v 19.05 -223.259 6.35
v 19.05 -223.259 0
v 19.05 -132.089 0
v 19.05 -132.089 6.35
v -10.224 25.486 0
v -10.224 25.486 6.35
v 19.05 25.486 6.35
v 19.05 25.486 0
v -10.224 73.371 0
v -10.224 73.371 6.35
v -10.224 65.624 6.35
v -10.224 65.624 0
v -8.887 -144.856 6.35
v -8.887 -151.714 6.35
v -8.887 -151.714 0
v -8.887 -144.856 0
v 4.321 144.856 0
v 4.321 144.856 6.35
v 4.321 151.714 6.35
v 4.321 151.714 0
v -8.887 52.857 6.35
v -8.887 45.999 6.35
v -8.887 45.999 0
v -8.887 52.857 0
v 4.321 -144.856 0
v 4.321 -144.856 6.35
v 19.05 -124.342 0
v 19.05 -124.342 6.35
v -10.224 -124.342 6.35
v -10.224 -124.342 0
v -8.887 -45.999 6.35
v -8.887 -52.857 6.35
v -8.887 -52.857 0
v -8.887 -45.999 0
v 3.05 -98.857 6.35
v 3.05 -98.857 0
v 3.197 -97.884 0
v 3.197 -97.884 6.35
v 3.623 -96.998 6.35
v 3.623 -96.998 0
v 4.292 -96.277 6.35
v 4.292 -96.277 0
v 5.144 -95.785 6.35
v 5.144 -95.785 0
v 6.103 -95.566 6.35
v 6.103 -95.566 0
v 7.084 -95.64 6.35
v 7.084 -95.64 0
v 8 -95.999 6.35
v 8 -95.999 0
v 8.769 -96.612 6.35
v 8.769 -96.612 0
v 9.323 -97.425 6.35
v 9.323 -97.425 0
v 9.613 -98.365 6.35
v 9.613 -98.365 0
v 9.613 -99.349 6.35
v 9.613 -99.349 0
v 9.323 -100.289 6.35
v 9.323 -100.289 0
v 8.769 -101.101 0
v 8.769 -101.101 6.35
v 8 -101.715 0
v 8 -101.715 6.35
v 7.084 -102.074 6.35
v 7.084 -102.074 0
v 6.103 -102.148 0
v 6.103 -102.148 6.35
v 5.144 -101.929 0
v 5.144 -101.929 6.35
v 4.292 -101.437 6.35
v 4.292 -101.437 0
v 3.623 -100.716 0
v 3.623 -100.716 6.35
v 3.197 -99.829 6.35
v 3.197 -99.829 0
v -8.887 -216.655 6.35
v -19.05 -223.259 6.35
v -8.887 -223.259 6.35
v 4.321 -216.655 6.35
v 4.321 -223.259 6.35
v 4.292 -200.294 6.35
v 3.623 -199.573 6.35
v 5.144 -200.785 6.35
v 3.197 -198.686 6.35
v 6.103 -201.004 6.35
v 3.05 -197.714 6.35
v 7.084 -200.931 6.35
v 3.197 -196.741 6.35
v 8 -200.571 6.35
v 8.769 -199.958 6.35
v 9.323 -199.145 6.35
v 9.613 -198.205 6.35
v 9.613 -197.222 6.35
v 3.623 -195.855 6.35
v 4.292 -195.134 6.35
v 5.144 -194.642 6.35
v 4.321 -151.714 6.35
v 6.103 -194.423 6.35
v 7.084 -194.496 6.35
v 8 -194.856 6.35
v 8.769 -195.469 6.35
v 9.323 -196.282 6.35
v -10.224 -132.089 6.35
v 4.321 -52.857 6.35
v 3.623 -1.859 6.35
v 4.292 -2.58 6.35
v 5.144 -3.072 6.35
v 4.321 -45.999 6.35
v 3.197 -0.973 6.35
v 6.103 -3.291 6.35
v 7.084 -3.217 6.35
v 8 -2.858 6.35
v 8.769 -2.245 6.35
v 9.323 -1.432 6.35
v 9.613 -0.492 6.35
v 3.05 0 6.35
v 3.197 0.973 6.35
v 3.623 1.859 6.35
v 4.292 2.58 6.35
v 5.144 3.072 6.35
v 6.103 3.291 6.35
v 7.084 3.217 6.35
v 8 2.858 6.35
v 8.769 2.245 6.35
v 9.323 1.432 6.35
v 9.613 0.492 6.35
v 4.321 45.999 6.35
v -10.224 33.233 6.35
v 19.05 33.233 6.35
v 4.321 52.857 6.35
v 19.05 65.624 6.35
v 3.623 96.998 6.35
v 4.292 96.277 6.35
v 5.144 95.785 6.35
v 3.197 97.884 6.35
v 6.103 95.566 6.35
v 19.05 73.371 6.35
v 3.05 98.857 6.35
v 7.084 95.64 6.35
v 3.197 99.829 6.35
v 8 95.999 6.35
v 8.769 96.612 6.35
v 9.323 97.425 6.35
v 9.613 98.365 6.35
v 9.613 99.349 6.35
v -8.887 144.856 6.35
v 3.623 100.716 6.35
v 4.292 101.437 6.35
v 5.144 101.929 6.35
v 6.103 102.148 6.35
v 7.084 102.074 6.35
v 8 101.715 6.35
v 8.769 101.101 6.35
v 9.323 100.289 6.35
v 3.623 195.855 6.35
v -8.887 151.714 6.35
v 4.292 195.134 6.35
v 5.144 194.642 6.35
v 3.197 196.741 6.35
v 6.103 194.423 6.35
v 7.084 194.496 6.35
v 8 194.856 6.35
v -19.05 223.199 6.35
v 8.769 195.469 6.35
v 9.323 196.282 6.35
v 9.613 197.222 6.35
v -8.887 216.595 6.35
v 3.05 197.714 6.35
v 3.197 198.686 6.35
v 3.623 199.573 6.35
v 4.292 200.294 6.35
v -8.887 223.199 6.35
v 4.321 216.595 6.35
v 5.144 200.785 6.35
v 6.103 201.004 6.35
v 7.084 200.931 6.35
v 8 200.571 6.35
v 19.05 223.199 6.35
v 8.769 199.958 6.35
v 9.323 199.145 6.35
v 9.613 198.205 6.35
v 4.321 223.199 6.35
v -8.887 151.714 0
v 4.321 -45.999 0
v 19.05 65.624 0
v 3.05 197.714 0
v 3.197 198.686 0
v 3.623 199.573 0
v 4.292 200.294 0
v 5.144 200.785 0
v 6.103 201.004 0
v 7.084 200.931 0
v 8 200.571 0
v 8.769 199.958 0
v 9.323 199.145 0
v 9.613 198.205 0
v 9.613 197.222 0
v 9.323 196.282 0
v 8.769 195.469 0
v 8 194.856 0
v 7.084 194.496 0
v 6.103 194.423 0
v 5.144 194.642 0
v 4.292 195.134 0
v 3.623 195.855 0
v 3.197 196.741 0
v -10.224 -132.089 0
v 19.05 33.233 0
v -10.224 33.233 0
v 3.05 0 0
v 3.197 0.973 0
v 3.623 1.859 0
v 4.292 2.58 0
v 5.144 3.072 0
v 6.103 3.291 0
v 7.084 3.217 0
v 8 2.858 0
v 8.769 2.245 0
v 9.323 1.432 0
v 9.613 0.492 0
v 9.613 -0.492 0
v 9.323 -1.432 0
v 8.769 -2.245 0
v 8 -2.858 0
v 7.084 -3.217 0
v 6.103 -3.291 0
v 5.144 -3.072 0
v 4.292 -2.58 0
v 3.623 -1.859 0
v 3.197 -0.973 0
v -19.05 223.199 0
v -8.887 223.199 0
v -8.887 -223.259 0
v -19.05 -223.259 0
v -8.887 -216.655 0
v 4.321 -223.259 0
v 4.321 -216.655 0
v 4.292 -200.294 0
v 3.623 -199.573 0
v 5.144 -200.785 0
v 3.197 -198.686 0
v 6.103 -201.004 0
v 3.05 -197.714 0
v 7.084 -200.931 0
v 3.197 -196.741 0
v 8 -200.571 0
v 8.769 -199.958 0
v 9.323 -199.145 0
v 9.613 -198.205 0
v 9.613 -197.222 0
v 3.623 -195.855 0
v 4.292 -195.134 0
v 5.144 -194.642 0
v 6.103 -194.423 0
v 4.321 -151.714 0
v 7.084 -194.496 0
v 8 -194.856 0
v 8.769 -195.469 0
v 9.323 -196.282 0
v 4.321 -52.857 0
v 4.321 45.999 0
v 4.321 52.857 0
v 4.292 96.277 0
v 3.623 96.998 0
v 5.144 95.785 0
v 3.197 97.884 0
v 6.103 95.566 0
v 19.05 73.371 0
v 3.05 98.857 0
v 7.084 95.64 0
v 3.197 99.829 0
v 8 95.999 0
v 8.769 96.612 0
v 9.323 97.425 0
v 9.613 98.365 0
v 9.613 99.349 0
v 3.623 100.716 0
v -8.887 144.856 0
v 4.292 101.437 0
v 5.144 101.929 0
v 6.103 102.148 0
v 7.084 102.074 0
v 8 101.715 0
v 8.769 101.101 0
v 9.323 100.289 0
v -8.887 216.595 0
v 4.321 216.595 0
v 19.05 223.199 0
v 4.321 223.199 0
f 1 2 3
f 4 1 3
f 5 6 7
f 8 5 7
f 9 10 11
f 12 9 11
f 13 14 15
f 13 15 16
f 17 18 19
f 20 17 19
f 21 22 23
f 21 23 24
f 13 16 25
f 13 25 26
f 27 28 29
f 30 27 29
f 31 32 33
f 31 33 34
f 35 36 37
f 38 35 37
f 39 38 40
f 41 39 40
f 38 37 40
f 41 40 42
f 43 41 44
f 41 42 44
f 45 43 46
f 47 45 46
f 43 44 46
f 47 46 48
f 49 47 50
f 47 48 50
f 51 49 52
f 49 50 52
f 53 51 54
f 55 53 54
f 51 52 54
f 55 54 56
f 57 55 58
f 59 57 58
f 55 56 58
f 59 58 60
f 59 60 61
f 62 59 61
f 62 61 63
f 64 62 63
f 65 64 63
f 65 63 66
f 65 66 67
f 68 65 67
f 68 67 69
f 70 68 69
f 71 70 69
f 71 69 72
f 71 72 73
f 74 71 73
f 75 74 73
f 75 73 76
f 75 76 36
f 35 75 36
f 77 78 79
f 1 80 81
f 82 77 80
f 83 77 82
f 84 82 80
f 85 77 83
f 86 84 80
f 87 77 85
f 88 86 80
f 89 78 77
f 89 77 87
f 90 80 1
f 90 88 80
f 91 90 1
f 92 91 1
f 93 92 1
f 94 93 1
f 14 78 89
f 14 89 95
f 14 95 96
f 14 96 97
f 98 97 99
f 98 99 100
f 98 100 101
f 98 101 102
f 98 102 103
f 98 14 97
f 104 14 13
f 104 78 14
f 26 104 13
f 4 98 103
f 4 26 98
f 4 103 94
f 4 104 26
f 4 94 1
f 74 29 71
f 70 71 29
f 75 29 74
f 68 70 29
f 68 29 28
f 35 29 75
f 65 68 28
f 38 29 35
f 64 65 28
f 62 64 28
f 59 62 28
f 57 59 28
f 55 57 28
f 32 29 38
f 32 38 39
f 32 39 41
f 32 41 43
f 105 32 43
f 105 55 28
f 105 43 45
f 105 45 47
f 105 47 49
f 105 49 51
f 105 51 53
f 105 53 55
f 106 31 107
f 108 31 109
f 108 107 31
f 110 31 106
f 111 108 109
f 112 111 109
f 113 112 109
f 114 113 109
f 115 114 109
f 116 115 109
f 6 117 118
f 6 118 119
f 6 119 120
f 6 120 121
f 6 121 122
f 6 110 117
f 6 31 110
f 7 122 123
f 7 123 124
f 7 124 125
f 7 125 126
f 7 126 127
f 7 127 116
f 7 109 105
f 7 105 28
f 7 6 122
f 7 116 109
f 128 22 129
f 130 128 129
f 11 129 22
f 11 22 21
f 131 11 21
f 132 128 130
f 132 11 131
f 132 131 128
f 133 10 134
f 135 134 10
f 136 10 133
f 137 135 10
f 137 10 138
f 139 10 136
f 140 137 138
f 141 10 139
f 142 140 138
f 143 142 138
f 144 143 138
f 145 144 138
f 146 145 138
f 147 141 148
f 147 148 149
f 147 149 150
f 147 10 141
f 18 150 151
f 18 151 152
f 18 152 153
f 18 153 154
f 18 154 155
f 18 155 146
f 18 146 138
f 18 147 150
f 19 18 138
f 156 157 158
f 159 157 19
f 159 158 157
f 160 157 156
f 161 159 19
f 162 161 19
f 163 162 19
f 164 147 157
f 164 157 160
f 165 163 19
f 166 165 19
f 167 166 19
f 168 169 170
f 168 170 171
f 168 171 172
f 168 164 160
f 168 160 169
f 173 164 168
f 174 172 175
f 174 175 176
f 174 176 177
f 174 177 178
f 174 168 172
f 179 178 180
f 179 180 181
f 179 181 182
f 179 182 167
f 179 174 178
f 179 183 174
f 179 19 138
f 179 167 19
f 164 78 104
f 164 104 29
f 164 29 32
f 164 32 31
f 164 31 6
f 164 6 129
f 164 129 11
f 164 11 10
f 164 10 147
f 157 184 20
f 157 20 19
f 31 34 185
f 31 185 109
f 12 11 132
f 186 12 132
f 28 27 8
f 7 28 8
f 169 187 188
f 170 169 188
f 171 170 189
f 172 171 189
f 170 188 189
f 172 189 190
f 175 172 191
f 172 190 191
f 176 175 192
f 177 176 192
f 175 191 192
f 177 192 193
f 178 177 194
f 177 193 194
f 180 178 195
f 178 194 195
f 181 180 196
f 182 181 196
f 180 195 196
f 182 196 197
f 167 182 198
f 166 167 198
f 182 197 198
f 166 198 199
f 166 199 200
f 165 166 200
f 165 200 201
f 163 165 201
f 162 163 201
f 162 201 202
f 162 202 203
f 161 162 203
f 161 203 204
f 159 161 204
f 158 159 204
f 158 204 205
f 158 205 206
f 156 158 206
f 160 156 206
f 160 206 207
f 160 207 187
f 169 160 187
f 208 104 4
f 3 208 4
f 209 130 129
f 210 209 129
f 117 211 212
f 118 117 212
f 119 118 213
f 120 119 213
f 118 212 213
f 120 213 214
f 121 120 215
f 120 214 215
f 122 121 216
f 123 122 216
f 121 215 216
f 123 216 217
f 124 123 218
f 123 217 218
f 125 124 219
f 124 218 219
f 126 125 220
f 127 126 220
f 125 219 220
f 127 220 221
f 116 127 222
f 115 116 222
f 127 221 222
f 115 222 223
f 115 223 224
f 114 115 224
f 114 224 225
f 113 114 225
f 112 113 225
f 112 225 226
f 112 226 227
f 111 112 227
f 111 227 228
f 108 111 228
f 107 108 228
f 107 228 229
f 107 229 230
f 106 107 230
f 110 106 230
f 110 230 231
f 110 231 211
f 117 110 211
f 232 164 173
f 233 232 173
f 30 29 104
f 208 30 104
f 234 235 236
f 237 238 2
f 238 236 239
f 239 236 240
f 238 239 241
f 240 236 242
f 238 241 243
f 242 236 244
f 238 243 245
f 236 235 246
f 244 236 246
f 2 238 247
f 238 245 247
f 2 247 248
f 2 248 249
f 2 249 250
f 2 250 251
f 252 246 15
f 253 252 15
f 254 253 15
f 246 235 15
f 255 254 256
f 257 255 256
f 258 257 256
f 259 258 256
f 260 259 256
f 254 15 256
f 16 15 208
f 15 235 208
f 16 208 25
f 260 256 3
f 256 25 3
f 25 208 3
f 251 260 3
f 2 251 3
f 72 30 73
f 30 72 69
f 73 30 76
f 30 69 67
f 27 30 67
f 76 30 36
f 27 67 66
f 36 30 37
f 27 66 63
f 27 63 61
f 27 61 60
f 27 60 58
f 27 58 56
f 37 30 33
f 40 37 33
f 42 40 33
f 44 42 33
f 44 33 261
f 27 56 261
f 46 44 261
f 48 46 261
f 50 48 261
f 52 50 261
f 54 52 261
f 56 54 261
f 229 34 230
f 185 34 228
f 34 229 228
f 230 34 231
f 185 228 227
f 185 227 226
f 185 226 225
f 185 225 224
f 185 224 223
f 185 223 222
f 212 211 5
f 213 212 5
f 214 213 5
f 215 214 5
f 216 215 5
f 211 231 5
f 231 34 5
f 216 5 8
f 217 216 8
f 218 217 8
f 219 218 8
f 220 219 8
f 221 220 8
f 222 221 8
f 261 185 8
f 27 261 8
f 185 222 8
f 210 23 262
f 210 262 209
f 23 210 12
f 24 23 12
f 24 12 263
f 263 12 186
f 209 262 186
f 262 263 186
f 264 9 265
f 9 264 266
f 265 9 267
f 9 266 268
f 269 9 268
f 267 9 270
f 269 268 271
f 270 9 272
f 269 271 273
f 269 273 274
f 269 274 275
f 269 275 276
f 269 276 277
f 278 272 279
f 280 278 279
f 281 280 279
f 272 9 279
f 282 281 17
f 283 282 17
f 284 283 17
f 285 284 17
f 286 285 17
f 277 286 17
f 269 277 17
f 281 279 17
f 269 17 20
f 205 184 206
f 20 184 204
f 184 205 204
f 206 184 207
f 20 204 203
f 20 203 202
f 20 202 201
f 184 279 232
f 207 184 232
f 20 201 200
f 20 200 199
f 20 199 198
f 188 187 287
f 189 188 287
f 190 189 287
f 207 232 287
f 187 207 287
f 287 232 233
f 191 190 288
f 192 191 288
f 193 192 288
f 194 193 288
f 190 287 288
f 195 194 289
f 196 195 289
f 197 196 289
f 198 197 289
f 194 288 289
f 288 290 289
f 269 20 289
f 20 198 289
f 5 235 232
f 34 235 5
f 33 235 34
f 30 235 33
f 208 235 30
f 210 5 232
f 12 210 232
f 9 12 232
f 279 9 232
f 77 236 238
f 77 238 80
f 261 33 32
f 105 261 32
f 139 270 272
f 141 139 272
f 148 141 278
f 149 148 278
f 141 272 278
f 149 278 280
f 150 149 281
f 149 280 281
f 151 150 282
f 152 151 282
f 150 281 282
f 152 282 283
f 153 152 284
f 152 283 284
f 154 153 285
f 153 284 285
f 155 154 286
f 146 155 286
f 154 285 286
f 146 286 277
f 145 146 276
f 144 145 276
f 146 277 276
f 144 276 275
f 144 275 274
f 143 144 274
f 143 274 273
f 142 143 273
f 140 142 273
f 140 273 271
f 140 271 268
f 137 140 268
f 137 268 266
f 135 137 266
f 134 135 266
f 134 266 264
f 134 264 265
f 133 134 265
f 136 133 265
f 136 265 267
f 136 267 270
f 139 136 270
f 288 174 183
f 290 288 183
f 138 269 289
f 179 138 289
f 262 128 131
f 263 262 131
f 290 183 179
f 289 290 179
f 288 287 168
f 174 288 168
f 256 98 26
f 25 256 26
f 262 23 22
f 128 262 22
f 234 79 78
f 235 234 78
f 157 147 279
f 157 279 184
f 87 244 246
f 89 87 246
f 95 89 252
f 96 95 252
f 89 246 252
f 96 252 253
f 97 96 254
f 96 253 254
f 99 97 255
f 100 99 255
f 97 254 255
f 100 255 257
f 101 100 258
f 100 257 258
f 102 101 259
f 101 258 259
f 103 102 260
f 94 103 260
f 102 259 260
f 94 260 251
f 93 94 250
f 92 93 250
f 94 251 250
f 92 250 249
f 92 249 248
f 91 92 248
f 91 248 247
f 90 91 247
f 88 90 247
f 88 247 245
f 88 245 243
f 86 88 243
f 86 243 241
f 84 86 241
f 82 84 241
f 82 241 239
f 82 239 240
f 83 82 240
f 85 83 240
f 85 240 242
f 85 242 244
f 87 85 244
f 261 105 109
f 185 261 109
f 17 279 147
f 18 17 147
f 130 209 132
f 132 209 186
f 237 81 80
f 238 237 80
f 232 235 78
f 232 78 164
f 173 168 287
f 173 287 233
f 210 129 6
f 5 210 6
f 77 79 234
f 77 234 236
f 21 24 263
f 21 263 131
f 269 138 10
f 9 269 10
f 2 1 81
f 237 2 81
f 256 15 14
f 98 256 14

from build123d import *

# Parameters (mm, degrees)
SKETCH1_W             = 38.1
SKETCH1_H             = 498.348
SKETCH1_R             = 3
BOSS_EXTRUDE1_DEPTH   = 6.35
M6_CLEARANCE_HOLE1_D  = 6.6
LPATTERN1_COUNT       = 3
LPATTERN1_PITCH       = 98.8568
LPATTERN1_COL_COUNT   = 3
LPATTERN1_COL_PITCH   = 98.8568
SKETCH4_W             = 26.9875
SKETCH4_H             = 3.175
SKETCH4_W_2           = 25.7175
CUT_EXTRUDE1_DEPTH    = 250.981813891
LPATTERN2_START       = -8.887219794
LPATTERN2_OUTLINE_W   = 6.858
LPATTERN2_OUTLINE_H   = 6.35
LPATTERN2_OUTLINE_W_2 = 6.604
LPATTERN2_DEPTH       = 13.208


# Read off the part's stored shape, not the designer's step: LPattern2
with BuildPart() as part:
    # Sketch1 → Boss-Extrude1 (new body)
    with BuildSketch(Plane.XY):
        Rectangle(SKETCH1_W, SKETCH1_H)
        with Locations((6.35, 0)):
            Circle(SKETCH1_R, mode=Mode.SUBTRACT)
    extrude(amount=BOSS_EXTRUDE1_DEPTH)

    # M6 Clearance Hole1 (through all)
    with Locations(Plane.XY.offset(6.35)):
        with Locations((6.35, 0)):
            m6_clearance_hole1 = Hole(M6_CLEARANCE_HOLE1_D / 2)

    # LPattern1: M6 Clearance Hole1 ×3
    with Locations(*[(0, -i * LPATTERN1_PITCH, 0) for i in range(1, LPATTERN1_COUNT)]):
        add(m6_clearance_hole1, mode=Mode.SUBTRACT)

    # LPattern1 col: M6 Clearance Hole1 ×3
    with Locations(*[(0, i * LPATTERN1_COL_PITCH, 0) for i in range(1, LPATTERN1_COL_COUNT)]):
        add(m6_clearance_hole1, mode=Mode.SUBTRACT)

    # Sketch4 → Cut-Extrude1 (cut, through all)
    with BuildSketch(Plane.XY.offset(6.35)):
        Polygon((-8.9535, -231.0064), (-8.9535, -223.2594), (-19.05, -223.2594), (-19.05, -249.174), (19.05, -249.174), (19.05, -231.0064), align=None)
        Polygon((19.05, -225.5454), (19.05, -223.2594), (-8.9535, -223.2594), (-8.9535, -231.0064), (19.05, -231.0064), (19.05, -228.7204), (-6.6675, -228.7204), (-6.6675, -225.5454), align=None)
        with Locations((5.55625, -128.2159)):
            Rectangle(SKETCH4_W, SKETCH4_H)
        Polygon((-10.2235, -132.0894), (19.05, -132.0894), (19.05, -129.8034), (-7.9375, -129.8034), (-7.9375, -126.6284), (19.05, -126.6284), (19.05, -124.3424), (-10.2235, -124.3424), align=None)
        with Locations((6.19125, -227.1329)):
            Rectangle(SKETCH4_W_2, SKETCH4_H)
        with Locations((5.55625, 29.3591)):
            Rectangle(SKETCH4_W, SKETCH4_H)
        Polygon((-10.2235, 25.4856), (19.05, 25.4856), (19.05, 27.7716), (-7.9375, 27.7716), (-7.9375, 30.9466), (19.05, 30.9466), (19.05, 33.2326), (-10.2235, 33.2326), align=None)
        Polygon((19.05, 71.0852), (19.05, 73.3712), (-10.2235, 73.3712), (-10.2235, 65.6242), (19.05, 65.6242), (19.05, 67.9102), (-7.9375, 67.9102), (-7.9375, 71.0852), align=None)
        with Locations((5.55625, 69.4977)):
            Rectangle(SKETCH4_W, SKETCH4_H)
        Polygon((-19.05, 249.174), (-19.05, 223.1992), (-10.2235, 223.1992), (-10.2235, 230.9462), (19.05, 230.9462), (19.05, 249.174), align=None)
        with Locations((5.55625, 227.0727)):
            Rectangle(SKETCH4_W, SKETCH4_H)
        Polygon((-10.2235, 230.9462), (-10.2235, 223.1992), (19.05, 223.1992), (19.05, 225.4852), (-7.9375, 225.4852), (-7.9375, 228.6602), (19.05, 228.6602), (19.05, 230.9462), align=None)
    extrude(amount=-CUT_EXTRUDE1_DEPTH, mode=Mode.SUBTRACT)

    # LPattern2 outline → LPattern2 (cut)
    with BuildSketch(Plane.YZ.offset(LPATTERN2_START)):
        with Locations((148.2852, 3.175)):
            Rectangle(LPATTERN2_OUTLINE_W, LPATTERN2_OUTLINE_H)
        with Locations((219.8972, 3.175)):
            Rectangle(LPATTERN2_OUTLINE_W_2, LPATTERN2_OUTLINE_H)
        with Locations((49.4284, 3.175)):
            Rectangle(LPATTERN2_OUTLINE_W, LPATTERN2_OUTLINE_H)
        with Locations((-49.4284, 3.175)):
            Rectangle(LPATTERN2_OUTLINE_W, LPATTERN2_OUTLINE_H)
        with Locations((-148.2852, 3.175)):
            Rectangle(LPATTERN2_OUTLINE_W, LPATTERN2_OUTLINE_H)
        with Locations((-219.9574, 3.175)):
            Rectangle(LPATTERN2_OUTLINE_W_2, LPATTERN2_OUTLINE_H)
    extrude(amount=LPATTERN2_DEPTH, mode=Mode.SUBTRACT)


solid = part.part
